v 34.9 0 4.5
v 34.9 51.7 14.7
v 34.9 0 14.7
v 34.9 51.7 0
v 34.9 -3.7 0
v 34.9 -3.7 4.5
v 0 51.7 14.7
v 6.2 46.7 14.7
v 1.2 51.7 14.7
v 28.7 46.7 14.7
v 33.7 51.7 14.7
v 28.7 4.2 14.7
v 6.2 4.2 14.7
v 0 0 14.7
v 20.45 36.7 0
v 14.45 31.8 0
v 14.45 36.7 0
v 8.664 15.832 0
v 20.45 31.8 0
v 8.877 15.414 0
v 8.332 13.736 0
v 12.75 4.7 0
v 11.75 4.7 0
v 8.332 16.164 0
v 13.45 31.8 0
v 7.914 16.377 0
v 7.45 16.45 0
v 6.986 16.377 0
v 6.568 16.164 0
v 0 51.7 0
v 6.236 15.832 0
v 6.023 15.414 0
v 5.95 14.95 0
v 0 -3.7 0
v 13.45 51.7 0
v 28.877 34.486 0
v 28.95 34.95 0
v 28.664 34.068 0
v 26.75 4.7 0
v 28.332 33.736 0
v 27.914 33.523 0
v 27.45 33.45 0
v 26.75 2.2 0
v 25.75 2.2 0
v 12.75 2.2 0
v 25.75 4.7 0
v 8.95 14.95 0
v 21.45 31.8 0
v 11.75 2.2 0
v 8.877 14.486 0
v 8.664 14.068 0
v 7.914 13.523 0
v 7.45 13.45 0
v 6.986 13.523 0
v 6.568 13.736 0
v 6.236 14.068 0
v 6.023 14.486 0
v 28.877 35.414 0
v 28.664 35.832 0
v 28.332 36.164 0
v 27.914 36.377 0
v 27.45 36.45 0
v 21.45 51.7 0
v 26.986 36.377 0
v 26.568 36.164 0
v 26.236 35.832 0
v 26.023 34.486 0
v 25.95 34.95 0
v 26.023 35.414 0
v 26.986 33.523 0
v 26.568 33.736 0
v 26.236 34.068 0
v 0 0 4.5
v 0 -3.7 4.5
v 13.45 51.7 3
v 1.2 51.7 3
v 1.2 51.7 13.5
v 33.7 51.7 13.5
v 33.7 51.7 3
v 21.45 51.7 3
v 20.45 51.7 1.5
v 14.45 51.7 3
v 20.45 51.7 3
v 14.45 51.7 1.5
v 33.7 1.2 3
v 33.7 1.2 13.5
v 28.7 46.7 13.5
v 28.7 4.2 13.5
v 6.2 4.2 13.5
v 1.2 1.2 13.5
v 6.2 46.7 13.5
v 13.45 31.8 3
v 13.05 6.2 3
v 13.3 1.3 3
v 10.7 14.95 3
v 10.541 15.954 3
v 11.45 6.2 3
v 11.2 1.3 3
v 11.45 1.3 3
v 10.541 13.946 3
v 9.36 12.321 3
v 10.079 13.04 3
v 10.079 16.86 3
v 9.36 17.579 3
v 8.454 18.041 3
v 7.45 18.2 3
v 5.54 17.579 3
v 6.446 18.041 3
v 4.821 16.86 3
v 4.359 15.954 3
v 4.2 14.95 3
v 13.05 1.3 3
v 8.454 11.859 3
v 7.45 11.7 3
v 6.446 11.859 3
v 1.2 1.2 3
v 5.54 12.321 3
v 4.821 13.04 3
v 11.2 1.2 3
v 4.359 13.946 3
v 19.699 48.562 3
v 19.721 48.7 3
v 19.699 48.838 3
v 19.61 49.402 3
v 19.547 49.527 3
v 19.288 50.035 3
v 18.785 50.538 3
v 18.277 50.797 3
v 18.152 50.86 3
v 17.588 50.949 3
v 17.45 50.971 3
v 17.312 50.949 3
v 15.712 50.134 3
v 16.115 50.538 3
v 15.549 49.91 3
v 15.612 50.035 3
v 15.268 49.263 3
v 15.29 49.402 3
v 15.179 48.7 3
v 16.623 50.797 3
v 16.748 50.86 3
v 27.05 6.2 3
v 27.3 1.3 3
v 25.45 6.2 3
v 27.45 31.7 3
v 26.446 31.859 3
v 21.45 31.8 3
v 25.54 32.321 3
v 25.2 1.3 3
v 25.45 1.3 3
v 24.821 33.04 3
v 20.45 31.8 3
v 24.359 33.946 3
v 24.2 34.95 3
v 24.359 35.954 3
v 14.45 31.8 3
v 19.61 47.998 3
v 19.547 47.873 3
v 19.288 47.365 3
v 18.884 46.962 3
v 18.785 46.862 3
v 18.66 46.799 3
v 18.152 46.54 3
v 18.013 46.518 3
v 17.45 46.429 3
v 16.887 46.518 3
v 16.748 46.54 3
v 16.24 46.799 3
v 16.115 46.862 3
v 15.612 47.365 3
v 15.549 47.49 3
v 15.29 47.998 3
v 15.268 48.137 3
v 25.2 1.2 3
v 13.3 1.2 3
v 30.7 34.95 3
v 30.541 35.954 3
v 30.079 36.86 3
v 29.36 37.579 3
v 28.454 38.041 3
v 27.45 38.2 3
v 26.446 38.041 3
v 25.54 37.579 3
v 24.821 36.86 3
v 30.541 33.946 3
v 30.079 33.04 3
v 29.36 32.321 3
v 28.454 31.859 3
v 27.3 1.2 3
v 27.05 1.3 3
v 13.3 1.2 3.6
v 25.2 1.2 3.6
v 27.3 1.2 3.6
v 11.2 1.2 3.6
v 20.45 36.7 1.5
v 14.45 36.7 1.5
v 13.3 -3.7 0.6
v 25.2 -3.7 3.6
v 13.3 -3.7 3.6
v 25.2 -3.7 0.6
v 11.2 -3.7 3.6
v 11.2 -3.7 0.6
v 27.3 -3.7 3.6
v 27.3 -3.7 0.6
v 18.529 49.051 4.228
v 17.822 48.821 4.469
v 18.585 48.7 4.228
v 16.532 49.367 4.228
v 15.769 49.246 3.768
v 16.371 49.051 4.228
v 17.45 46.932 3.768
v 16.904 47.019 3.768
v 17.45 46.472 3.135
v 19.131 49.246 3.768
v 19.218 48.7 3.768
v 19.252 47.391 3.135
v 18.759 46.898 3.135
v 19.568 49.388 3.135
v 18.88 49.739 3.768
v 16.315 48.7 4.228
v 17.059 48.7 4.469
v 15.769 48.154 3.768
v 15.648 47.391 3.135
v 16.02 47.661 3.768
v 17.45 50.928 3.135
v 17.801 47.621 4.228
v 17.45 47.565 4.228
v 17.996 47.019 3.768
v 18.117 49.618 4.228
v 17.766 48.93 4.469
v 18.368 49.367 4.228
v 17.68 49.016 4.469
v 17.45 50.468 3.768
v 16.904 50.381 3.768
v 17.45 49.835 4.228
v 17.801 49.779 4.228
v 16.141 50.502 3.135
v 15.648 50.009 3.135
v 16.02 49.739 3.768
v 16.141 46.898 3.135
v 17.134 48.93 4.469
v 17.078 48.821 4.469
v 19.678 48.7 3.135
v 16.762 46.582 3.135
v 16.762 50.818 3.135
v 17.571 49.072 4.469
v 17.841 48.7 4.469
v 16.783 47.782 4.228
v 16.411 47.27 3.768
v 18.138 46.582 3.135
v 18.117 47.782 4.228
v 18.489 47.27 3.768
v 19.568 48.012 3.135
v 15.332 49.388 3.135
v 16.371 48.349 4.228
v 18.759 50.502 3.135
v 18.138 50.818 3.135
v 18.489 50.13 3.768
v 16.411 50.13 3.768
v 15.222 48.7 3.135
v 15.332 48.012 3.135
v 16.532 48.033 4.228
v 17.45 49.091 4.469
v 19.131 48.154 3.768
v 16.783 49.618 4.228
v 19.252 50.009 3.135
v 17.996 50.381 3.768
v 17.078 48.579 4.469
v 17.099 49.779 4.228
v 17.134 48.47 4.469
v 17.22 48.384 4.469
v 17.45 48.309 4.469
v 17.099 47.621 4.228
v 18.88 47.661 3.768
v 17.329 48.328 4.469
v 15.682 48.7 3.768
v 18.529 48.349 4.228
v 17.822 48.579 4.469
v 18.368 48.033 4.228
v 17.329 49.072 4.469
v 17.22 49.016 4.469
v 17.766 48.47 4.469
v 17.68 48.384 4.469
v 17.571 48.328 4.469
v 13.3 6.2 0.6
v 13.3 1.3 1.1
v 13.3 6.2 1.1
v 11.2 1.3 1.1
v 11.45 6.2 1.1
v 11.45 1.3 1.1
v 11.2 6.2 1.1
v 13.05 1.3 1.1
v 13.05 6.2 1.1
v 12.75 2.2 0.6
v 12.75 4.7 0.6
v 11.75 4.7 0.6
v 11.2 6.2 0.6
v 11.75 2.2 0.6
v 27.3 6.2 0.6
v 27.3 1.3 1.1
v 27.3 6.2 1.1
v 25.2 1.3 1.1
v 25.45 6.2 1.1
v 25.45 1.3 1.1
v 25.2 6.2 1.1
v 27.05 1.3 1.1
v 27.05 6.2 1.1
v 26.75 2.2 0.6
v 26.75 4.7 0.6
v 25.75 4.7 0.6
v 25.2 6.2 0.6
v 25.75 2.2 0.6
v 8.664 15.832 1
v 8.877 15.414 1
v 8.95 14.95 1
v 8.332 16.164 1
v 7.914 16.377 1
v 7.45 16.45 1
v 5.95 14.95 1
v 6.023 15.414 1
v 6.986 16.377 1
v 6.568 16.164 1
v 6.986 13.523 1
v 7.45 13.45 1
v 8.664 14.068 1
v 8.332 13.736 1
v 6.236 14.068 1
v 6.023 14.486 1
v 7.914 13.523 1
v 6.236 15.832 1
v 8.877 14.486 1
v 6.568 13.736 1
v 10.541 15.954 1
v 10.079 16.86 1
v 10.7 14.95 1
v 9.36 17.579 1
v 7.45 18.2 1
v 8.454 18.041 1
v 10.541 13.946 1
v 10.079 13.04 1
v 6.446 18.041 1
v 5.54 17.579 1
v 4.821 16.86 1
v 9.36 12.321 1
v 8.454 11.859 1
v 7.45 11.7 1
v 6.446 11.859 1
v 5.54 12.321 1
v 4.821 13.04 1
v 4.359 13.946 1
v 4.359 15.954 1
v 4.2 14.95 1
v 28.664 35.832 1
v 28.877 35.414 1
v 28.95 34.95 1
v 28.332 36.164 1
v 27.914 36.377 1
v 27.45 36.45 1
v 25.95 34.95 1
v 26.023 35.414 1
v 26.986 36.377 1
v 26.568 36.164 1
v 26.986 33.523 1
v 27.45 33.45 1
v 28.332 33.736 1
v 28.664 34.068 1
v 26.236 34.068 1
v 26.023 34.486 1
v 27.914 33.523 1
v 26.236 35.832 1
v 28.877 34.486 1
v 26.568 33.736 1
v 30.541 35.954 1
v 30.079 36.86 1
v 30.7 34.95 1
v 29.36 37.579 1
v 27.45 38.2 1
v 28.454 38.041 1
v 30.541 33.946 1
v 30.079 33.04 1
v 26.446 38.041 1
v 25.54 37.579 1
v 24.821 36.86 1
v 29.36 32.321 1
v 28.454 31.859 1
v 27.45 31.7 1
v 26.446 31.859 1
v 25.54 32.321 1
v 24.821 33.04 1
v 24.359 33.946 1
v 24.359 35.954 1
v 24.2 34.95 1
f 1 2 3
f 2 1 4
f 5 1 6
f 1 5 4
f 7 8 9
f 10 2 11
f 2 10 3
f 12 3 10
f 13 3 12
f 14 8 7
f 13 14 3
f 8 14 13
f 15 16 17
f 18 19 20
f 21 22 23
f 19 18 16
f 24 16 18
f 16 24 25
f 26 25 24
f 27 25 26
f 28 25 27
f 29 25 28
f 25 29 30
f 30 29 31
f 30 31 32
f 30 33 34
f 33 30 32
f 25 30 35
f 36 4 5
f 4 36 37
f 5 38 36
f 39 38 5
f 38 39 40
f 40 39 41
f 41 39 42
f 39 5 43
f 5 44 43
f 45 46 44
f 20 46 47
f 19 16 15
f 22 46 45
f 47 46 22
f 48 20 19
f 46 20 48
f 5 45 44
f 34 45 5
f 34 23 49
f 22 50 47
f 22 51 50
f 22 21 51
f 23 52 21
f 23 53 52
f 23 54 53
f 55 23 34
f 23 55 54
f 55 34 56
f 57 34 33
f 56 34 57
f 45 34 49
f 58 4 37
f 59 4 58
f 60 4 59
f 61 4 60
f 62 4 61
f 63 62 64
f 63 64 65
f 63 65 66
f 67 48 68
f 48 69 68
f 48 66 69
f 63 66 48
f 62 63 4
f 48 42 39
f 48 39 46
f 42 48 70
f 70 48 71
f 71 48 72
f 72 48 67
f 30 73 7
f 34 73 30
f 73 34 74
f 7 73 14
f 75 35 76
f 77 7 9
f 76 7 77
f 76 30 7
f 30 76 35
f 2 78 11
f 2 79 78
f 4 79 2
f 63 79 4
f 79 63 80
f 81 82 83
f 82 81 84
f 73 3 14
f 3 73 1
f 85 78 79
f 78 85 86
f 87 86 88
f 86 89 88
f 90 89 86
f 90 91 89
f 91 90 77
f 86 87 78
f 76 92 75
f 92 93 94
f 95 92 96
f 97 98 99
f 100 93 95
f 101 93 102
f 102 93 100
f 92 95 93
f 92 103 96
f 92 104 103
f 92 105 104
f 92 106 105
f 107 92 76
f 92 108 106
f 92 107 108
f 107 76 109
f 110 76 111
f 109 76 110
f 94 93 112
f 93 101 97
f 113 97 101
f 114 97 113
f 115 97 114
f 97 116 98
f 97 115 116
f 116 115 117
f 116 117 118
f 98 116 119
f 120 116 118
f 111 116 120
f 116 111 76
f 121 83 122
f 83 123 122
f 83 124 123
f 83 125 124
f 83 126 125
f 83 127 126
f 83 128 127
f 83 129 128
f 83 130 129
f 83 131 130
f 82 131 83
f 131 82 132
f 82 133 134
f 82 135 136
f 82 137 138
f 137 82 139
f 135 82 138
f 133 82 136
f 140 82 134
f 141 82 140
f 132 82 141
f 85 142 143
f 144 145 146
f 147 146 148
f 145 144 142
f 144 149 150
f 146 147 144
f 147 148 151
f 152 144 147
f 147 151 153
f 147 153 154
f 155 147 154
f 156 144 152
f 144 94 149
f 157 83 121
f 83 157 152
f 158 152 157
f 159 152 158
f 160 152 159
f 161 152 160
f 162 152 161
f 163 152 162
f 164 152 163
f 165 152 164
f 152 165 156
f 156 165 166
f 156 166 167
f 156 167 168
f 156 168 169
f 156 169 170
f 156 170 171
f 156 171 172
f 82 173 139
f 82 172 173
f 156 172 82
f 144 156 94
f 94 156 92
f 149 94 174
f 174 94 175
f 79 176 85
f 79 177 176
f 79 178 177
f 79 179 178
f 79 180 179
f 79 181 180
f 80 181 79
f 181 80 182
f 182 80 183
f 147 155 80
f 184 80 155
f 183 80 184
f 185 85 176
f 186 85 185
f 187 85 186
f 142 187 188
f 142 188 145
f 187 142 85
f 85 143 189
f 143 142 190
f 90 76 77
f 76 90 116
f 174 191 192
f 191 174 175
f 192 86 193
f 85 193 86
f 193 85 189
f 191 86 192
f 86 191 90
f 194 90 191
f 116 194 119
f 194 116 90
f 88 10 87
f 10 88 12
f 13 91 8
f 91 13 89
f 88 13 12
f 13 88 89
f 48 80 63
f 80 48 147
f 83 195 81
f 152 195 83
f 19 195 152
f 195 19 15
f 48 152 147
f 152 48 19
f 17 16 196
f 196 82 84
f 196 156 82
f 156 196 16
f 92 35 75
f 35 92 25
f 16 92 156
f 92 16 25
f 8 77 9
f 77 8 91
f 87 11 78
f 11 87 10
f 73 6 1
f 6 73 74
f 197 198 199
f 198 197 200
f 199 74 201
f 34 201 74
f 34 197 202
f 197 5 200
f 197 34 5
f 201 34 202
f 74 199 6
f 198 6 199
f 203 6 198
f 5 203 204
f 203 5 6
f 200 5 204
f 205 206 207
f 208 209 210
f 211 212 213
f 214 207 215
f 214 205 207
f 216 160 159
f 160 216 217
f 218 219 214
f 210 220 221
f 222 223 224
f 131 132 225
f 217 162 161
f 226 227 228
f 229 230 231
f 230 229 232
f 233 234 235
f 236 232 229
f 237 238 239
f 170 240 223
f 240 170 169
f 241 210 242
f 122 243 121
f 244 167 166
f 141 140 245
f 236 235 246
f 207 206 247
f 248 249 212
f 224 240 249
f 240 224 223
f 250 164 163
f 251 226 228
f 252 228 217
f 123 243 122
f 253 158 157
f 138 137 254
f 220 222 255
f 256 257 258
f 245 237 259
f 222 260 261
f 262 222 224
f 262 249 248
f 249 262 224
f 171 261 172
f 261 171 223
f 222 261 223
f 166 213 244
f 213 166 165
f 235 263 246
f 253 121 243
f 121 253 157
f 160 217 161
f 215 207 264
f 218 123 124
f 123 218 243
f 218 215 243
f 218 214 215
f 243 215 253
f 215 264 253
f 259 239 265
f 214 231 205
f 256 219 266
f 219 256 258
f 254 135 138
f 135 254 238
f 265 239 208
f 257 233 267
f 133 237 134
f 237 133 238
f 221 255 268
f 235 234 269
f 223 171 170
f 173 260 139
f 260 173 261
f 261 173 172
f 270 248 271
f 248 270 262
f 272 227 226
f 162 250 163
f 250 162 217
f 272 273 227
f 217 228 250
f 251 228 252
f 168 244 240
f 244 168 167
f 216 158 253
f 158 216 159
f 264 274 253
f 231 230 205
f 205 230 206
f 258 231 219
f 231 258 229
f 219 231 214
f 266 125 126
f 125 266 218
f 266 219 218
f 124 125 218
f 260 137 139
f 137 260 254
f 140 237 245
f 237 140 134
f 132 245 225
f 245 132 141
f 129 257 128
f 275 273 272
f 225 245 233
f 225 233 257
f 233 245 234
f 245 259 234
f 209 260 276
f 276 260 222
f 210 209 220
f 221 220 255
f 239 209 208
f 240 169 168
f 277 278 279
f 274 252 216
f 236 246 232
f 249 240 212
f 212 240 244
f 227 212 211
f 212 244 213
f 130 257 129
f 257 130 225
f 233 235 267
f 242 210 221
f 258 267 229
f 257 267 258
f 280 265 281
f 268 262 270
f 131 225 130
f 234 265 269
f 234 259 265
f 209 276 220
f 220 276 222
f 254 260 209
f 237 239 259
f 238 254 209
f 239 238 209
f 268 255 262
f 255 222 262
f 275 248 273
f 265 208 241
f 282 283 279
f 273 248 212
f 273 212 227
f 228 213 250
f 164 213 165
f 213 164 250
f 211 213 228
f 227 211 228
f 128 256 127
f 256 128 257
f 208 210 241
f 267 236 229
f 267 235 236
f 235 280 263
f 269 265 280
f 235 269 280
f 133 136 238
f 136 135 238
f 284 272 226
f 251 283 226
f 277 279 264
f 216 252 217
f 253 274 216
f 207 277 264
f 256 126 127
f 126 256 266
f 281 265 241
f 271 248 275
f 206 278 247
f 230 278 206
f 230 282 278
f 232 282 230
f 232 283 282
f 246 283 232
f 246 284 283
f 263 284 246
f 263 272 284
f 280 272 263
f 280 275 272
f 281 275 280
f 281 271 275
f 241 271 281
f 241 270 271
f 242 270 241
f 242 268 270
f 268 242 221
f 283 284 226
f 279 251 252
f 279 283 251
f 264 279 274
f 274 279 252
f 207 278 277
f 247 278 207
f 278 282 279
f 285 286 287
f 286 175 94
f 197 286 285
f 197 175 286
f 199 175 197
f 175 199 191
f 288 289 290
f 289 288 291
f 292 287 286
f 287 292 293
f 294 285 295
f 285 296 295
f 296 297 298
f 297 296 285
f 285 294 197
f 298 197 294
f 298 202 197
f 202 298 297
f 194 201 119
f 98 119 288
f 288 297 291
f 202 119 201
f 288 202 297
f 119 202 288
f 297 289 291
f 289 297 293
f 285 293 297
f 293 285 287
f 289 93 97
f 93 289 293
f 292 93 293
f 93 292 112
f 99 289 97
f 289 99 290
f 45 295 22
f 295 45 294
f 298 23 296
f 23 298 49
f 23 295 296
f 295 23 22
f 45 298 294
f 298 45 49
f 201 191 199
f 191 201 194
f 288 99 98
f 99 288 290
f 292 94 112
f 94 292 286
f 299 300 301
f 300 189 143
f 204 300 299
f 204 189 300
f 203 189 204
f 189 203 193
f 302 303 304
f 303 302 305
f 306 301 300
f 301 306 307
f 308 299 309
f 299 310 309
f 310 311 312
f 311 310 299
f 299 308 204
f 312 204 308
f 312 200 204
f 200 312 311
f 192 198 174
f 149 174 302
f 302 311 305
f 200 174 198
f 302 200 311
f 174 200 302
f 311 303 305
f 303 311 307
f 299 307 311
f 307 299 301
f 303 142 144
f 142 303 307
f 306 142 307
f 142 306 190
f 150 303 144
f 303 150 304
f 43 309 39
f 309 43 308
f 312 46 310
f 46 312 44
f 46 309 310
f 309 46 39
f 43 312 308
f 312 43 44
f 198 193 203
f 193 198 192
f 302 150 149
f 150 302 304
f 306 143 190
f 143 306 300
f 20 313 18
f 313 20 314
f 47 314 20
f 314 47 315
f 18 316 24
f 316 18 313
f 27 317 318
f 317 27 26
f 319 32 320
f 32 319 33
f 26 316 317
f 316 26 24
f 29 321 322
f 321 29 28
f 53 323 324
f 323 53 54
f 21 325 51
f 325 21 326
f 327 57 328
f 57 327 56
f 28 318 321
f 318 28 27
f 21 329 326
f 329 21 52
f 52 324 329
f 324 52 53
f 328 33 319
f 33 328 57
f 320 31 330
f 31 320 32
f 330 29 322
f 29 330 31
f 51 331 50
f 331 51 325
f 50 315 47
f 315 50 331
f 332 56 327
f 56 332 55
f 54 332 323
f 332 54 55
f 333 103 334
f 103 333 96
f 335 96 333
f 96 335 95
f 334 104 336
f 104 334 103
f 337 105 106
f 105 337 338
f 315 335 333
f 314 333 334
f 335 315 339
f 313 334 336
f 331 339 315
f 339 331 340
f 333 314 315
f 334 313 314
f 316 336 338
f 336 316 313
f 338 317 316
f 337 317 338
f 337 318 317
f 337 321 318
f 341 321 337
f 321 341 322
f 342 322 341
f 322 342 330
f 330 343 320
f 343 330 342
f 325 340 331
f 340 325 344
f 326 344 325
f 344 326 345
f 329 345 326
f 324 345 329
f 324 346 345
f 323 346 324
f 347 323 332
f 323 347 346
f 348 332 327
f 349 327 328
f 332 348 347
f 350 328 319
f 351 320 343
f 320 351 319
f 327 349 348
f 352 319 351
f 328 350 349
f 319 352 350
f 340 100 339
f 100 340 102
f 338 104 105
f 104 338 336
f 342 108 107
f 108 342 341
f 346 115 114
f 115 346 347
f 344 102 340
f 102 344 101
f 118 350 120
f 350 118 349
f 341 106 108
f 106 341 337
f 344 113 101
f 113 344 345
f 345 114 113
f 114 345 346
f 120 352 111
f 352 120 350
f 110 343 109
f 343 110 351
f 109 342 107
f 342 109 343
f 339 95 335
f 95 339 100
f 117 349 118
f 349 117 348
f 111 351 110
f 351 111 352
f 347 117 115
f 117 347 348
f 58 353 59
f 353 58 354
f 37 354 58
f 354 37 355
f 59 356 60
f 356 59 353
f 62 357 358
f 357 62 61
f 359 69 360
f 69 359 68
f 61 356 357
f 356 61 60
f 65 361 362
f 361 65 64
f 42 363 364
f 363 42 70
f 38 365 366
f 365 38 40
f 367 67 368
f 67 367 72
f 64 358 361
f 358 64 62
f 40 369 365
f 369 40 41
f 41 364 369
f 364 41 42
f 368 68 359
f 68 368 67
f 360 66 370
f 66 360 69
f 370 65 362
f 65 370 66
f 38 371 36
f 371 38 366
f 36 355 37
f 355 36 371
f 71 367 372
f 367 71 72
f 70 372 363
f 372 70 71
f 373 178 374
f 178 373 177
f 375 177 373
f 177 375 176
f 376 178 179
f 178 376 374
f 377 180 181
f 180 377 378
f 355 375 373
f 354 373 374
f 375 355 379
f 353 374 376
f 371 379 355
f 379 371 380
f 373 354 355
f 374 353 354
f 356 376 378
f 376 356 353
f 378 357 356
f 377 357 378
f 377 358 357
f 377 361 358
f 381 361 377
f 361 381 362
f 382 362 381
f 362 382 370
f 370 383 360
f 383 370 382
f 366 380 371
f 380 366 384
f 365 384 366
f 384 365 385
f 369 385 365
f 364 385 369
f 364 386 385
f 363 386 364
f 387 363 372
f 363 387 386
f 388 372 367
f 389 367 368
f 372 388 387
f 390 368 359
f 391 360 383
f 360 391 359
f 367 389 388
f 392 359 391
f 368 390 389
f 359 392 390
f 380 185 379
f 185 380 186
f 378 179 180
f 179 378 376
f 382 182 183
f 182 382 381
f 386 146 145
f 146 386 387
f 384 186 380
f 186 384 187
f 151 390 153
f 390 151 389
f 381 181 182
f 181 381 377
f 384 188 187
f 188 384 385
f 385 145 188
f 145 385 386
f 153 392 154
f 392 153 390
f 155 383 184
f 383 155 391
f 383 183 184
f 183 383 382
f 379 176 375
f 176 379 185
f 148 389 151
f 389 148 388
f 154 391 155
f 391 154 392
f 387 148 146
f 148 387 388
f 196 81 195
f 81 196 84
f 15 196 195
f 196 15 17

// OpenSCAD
//preview[view:north, tilt:top]

/* [Basic] */
//width of battery (x axis)
width = 32.5;
//depth of battery (y axis)
depth = 47.5;
//height of batter (z axis) 
height = 10.5;
//vertical walls and top holder 
wallThickness = 1.2;
//base horizontal wall thickness
baseThickness = 3; 
//additonal depth of adapter for battery lock
lockLength = 3;
//width of top horizontal battery holder frame 
holderWidth = 5;
//create contact cover (yes/no) 
contactCover = 1; //[0:No,1:Yes]
//contact 1 distance from left battery edge 
contact1Distance = 10;
//contact 2 distance from left battery edge 
contact2Distance = 24;
//create mount holes (yes/no) 
Holes = 1; //[0:No,1:Yes] 
holeDiameter = 3;
//diameter of top screw head
holeHeadDiameter = 6.5;
//height of top screw head 
holeHeadHeight = 2;
//hole distance at x axis (width) 
holeXDistance = 20;
//hole distance at y axis (depth) 
holeYDistance = 20; 

/* [Advanced] */
//contact depth in inner battery box (how much is sinked into)
contactDepth = 5;
//total contact lenght 
contactLength = 10;
//contact bottom width 
contactBWidth = 2.1;
//contact top width (exposed to battery) 
contactTWidth = 1.6;
//contact hole height, should be less than contact height 
contactHeight = 2.5;
//distance of contact lock from contact tip 
contactLockDist = 4; 

/* [Hidden] */
//Number of facets
$fn = 20;

difference() {
	battery_box();
	//contact1
	translate([contact1Distance + wallThickness,contactDepth + wallThickness - contactLength, baseThickness - contactHeight + 0.1]) {
		contact();
	}
	//contact2
	translate([contact2Distance + wallThickness,contactDepth + wallThickness - contactLength, baseThickness - contactHeight + 0.1]) {
		contact();
	}
	//lock spacer
	translate([width/2-2*wallThickness,depth+lockLength+wallThickness -15,-baseThickness+1.5]){
	cube([7,lockLength + 15,baseThickness]);
	}
	//mount holes
	if(Holes == 1) {
		translate([(width-holeXDistance)/2+wallThickness,(depth-holeYDistance)/2+wallThickness,0]) { screwHole();}
		translate([(width-holeXDistance)/2+wallThickness+holeXDistance,(depth-holeYDistance)/2+wallThickness+holeYDistance,0]) { screwHole();}

	}
}


module battery_box() {
	difference() {
		cube([width+2*wallThickness,depth+wallThickness+lockLength,height+wallThickness+baseThickness],false);
		translate([wallThickness,wallThickness,baseThickness]){
			cube([width,depth+lockLength+0.1,height]);
		}
		translate([wallThickness+holderWidth,wallThickness+lockLength,baseThickness]){
			cube([width-2*holderWidth,depth+0.1,height+wallThickness+0.1]);
		}
		translate([wallThickness+width/2+3,depth+wallThickness+lockLength-20+0.1,-0.1]){
			cube([1,20,baseThickness+0.2]);
		}
		translate([wallThickness+width/2-4,depth+wallThickness+lockLength-20+0.1,-0.1]){
			cube([1,20,baseThickness+0.2]);
		}
		//chamfer
		translate([width/2+wallThickness,depth+wallThickness+lockLength-width/2,baseThickness+height-0.1]){
			rotate([0,0,45]){
				cube([sqrt(pow(width+2*wallThickness,2)/2),sqrt(pow(width+2*wallThickness,2)/2),wallThickness+0.2]);
			}
		}
	
	}
	//contact cover
	if (contactCover == 1) {
		translate([0,wallThickness+contactDepth-contactLength+0.1,0]){
		cube([width+2*wallThickness,contactLength-wallThickness-contactDepth-0.1,baseThickness+1.5]);
		}
	}
	//lock stump
		translate([wallThickness+width/2,depth+wallThickness,baseThickness-1]){
			sphere(d=5);
	}
}

module contact() {

union() {	
		cube([contactBWidth,contactLength,0.5]);
		translate([(contactBWidth - contactTWidth)/2, contactLength - contactDepth,0]){
			cube([contactTWidth,contactDepth,contactHeight]);
		}
		cube([contactBWidth,contactLength- contactDepth,contactHeight]);
		translate([(contactBWidth - 1)/2,contactLength - contactLockDist,-5]){
			cube([1,2.5,5]);
		}
	
		translate([0, 0,0]){
			cube([contactBWidth,contactLength-contactDepth+0.1,3]);
		}

	}
}

module screwHole() {
	union() {
		translate([0, 0,-0.1]){
			cylinder(h=baseThickness+0.2, r=holeDiameter/2);
		}
		translate([0, 0,baseThickness - holeHeadHeight]){
			cylinder(h=holeHeadHeight+0.1, r=holeHeadDiameter/2);
		}
	}
}

